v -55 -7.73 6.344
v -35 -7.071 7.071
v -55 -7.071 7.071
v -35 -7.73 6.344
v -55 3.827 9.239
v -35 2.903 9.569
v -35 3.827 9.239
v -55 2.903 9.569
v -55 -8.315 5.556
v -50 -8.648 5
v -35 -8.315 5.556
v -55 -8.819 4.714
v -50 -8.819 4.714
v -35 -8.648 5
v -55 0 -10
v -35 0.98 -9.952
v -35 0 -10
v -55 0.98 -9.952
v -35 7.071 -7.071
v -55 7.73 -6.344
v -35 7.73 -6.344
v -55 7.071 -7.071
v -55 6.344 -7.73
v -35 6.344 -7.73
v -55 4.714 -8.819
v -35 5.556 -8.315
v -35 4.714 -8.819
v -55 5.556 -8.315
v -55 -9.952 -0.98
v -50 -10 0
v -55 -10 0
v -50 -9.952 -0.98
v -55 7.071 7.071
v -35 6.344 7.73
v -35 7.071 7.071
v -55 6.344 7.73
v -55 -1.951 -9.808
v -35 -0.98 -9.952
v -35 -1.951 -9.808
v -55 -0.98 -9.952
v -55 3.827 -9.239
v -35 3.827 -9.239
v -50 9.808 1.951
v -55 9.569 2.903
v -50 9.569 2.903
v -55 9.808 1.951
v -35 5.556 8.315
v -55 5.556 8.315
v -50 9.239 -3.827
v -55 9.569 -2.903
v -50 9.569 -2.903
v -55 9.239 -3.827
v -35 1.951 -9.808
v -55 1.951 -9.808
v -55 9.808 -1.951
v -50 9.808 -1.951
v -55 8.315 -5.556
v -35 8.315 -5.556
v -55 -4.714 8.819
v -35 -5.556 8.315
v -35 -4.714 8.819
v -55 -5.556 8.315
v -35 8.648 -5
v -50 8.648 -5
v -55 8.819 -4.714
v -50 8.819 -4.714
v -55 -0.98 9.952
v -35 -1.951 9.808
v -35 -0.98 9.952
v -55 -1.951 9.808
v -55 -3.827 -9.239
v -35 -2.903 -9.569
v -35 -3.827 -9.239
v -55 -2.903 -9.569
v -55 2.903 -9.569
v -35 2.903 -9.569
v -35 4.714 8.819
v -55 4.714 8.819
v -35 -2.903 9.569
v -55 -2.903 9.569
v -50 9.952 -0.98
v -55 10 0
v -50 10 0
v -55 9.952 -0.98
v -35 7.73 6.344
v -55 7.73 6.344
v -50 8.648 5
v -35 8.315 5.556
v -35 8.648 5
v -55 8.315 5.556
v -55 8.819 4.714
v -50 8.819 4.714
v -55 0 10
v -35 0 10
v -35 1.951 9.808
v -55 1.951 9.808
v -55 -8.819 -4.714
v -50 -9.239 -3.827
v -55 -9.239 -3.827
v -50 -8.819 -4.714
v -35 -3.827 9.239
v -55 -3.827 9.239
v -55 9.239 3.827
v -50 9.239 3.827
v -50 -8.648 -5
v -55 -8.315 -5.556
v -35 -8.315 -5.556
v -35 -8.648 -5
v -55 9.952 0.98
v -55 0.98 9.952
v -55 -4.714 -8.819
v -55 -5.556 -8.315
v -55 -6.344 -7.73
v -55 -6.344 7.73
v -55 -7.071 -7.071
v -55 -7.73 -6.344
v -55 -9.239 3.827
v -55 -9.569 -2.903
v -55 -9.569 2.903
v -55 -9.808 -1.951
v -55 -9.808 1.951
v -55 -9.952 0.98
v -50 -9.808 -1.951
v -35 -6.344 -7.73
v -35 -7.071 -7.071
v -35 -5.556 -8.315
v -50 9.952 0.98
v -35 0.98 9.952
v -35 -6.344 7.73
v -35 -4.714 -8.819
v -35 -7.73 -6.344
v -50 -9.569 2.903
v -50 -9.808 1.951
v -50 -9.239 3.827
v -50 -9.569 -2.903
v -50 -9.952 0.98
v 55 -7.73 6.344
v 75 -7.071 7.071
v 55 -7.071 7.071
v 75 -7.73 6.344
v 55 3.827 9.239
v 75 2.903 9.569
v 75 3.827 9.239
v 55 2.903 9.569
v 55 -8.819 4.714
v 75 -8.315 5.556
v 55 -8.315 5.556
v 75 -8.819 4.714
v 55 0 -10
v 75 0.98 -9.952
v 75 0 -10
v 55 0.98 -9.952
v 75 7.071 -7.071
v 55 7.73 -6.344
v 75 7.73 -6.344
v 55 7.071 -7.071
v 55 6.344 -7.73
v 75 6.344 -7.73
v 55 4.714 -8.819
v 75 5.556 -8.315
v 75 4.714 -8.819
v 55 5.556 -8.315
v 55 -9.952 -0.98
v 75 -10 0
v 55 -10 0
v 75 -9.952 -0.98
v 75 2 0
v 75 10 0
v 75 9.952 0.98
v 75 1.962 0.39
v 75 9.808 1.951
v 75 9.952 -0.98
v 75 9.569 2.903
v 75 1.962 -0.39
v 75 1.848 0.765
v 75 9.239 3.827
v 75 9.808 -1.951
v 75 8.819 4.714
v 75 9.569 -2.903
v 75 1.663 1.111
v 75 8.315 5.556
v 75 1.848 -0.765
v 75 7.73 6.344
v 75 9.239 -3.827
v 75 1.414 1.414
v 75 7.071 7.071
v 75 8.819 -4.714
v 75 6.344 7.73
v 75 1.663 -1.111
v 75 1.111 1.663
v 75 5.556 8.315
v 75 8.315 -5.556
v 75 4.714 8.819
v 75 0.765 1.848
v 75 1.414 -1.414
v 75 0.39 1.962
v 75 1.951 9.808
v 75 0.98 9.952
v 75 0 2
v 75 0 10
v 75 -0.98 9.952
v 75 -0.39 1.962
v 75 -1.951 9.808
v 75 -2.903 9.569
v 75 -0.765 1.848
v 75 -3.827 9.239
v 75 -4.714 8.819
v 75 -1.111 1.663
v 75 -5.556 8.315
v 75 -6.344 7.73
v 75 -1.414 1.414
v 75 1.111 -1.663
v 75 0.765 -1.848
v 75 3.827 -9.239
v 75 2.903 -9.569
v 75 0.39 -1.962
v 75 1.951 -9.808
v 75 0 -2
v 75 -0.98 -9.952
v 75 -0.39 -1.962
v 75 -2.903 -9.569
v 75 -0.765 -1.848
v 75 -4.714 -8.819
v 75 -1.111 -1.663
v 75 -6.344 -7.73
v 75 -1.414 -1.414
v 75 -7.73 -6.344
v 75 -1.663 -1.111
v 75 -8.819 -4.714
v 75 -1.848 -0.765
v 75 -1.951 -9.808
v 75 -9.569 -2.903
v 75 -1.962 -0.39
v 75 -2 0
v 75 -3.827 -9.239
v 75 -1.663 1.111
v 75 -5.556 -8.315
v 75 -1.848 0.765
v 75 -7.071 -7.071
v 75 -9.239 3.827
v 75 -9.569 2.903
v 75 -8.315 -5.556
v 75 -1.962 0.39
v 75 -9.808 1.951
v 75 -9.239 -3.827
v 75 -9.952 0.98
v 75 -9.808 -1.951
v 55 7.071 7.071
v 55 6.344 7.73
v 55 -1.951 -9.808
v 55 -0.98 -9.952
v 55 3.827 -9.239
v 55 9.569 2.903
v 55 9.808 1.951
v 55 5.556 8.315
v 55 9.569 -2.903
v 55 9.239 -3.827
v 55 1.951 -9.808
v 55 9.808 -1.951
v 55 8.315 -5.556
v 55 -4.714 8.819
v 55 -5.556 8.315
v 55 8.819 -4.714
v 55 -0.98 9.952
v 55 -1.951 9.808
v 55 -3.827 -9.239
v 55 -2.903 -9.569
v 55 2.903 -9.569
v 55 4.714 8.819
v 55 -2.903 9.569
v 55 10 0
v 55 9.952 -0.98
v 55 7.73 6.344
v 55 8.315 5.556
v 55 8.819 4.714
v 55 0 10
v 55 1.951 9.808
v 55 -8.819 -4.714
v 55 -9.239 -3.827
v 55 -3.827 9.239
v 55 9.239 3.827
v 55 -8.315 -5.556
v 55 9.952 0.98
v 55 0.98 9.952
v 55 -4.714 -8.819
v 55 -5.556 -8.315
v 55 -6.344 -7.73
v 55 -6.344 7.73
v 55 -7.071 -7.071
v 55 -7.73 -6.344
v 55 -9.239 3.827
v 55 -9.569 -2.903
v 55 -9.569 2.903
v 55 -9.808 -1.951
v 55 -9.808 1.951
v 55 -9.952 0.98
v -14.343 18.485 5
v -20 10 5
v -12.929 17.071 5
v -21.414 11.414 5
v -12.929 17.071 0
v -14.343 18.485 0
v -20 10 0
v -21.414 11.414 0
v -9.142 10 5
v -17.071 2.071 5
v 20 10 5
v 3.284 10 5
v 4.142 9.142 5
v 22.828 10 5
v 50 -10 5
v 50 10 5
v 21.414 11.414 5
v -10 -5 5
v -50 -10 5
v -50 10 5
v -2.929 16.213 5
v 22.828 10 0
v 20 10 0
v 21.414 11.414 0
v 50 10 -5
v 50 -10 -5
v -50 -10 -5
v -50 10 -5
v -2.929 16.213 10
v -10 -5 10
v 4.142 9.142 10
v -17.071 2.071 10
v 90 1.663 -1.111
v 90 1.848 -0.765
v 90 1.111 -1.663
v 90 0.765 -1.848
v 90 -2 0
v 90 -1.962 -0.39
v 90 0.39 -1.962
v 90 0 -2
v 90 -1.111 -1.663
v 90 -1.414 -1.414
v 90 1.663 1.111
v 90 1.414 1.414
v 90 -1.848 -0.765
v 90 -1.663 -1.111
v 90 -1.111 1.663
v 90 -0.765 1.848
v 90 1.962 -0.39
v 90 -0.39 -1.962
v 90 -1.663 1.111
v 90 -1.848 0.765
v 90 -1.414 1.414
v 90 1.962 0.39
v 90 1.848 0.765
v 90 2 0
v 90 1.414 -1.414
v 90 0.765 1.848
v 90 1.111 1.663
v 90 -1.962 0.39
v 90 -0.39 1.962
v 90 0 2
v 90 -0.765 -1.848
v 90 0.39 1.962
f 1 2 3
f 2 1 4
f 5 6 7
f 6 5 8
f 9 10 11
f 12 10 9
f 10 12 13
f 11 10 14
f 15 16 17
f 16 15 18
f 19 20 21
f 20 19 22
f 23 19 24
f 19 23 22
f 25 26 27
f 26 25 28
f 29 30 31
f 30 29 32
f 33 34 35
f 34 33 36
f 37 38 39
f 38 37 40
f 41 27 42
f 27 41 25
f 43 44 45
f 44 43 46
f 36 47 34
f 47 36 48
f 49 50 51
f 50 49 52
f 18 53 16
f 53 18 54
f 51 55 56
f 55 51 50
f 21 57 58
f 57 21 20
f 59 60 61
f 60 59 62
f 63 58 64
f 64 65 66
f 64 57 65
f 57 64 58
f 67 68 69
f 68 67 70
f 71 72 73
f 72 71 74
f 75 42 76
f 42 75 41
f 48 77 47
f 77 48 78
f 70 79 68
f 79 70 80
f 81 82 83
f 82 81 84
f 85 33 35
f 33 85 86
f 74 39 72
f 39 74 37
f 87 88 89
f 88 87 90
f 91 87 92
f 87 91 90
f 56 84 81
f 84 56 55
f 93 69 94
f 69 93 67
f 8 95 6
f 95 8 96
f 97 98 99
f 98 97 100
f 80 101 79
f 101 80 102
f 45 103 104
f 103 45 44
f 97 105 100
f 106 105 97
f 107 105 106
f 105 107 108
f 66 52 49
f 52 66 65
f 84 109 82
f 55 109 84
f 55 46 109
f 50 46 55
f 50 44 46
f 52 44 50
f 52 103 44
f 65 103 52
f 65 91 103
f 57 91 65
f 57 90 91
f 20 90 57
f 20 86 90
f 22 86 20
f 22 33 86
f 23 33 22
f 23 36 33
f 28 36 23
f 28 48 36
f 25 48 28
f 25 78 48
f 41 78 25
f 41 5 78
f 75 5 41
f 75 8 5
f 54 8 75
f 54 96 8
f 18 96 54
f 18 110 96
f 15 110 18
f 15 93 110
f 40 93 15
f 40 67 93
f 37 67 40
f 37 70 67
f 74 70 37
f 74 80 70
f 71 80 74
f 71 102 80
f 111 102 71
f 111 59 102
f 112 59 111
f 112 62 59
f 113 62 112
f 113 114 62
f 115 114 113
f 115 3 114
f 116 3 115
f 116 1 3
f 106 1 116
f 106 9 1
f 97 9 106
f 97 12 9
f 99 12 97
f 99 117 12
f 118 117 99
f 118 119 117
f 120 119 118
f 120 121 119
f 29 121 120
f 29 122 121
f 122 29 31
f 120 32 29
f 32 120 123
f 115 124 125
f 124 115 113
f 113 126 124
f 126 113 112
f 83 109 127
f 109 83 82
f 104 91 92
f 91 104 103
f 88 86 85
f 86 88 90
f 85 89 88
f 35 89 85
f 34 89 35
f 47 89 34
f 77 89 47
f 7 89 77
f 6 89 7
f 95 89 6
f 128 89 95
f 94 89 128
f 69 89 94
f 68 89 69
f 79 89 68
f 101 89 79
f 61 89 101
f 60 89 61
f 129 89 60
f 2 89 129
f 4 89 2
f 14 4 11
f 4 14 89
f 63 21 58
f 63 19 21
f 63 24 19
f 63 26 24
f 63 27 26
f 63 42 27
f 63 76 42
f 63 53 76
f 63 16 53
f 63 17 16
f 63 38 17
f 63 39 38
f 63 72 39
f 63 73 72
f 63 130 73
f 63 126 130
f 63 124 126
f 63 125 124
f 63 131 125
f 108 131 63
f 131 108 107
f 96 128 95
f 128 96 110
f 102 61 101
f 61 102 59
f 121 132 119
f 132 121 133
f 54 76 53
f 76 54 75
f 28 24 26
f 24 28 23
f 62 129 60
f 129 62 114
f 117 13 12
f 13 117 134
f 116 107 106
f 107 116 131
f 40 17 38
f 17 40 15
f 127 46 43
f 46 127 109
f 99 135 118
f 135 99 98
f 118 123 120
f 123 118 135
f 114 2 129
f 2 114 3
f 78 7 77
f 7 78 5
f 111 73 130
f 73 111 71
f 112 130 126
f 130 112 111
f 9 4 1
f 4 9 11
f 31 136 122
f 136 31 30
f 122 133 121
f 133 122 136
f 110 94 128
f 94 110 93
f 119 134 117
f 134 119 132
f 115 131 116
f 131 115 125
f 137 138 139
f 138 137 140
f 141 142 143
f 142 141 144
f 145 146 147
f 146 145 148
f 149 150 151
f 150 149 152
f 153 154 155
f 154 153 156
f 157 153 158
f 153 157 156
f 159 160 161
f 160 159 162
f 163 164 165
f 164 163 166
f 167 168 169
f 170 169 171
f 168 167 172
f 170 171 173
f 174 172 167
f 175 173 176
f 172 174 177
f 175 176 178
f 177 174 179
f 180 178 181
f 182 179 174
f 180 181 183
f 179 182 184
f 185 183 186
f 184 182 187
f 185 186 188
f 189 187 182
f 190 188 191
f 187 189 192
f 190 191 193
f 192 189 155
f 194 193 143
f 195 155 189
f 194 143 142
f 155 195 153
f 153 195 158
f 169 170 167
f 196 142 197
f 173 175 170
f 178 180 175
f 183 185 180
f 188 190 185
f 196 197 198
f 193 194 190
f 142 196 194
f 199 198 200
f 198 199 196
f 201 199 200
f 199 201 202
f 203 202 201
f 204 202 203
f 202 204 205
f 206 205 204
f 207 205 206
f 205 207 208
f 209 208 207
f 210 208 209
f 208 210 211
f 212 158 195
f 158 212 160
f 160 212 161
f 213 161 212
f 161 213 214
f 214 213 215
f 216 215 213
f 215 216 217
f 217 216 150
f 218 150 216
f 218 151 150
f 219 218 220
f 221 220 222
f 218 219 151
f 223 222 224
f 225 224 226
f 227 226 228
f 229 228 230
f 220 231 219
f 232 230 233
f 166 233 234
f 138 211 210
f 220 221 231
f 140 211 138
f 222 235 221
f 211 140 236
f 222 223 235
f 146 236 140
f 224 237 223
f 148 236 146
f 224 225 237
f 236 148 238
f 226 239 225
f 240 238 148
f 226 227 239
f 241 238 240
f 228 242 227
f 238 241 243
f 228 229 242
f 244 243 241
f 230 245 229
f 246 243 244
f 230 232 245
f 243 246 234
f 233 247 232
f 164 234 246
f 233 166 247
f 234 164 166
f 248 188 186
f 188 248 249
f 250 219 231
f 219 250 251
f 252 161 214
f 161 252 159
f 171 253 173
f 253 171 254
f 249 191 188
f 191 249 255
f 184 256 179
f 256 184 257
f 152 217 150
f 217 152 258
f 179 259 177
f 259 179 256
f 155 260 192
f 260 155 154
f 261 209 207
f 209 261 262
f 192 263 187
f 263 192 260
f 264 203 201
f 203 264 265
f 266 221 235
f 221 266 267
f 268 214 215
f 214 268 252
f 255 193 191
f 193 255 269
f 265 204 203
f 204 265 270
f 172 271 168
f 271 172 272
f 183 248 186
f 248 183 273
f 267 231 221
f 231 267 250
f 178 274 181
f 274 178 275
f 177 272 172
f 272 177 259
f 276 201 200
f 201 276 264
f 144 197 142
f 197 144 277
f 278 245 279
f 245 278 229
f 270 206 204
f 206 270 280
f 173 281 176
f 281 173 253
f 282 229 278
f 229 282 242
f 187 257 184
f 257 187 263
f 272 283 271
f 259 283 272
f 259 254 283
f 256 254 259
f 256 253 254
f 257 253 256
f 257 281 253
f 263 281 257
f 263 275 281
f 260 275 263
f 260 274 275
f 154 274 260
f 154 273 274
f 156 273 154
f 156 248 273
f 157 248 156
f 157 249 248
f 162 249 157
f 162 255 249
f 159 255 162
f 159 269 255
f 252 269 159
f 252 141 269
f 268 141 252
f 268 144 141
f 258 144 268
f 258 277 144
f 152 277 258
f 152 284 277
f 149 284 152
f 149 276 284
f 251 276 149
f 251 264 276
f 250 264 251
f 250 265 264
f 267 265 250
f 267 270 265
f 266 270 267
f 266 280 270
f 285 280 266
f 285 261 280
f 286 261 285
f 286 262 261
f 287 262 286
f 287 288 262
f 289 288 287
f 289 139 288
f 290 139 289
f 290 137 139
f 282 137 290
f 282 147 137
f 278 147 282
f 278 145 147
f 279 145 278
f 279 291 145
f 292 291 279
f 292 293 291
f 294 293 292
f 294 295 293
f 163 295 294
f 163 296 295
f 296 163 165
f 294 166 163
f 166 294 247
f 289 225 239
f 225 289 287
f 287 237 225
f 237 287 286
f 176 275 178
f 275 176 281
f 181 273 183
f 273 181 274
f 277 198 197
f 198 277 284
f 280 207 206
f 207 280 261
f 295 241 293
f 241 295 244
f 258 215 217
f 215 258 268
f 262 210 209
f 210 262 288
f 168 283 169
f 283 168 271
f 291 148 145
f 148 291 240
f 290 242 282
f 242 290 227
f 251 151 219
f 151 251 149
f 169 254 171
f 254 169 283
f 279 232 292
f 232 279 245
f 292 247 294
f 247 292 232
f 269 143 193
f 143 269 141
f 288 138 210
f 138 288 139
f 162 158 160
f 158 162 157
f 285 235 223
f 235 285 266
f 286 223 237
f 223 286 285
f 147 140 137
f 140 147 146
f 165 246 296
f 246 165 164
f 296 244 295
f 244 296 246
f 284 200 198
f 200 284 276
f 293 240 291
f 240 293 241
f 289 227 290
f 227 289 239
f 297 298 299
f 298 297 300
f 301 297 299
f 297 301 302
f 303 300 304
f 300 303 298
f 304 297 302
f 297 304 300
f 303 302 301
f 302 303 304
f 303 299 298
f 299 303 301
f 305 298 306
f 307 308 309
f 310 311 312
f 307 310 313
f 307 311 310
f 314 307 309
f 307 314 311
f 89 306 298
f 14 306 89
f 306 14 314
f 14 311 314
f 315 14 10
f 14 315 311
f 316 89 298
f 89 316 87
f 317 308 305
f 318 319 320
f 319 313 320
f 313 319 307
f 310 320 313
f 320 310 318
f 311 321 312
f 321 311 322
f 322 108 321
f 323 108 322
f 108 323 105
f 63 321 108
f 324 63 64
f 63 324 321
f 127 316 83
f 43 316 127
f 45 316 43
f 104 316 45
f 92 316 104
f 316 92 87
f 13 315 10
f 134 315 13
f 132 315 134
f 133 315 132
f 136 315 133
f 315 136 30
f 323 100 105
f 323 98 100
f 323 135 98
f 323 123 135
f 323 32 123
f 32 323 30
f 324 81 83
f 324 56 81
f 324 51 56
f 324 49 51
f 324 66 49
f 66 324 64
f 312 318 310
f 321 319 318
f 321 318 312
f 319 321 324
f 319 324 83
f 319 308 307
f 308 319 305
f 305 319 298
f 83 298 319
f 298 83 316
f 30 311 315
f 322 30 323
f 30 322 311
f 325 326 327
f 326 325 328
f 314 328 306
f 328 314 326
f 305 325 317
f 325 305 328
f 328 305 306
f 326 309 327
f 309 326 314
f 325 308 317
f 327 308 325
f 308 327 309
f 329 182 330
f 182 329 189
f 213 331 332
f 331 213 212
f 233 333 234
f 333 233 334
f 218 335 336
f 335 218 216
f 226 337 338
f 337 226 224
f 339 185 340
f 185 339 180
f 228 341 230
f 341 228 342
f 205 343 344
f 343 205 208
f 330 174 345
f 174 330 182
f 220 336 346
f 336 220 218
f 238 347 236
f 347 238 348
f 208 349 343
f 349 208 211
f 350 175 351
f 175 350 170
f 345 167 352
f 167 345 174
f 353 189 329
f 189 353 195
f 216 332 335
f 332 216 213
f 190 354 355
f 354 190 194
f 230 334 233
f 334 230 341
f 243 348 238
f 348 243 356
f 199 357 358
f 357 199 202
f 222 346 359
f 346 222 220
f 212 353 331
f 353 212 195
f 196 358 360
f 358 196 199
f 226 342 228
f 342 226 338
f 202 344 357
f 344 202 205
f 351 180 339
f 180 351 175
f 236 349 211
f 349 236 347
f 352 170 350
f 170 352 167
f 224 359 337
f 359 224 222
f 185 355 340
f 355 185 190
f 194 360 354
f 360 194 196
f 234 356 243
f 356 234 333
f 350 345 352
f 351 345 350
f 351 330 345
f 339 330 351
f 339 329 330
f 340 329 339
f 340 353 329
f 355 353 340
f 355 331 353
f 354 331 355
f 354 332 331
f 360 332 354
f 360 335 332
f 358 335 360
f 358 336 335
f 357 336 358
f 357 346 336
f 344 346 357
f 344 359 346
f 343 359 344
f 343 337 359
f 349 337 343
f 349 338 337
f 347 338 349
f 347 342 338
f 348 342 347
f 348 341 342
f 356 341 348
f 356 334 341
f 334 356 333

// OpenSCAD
module armored_vehicle() {
    hull();
    end_pods();
    turret();
    barrel();
    fins();
}

module hull() {
    translate([-50, -10, -5])
        cube([100, 20, 10]);
}

module end_pods() {
    translate([-55, 0, 0])
        rotate([0, 90, 0])
        cylinder(h=20, r=10, $fn=64);
    translate([55, 0, 0])
        rotate([0, 90, 0])
        cylinder(h=20, r=10, $fn=64);
}

module turret() {
    translate([-10, -5, 5])
        scale([1, 1, 0.5])
        rotate([0, 0, 45])
        cube([20, 10, 10]);
}

module barrel() {
    translate([60, 0, 0])
        rotate([0, 90, 0])
        cylinder(h=30, r=2, $fn=32);
}

module fins() {
    translate([-20, 10, 0])
        rotate([0, 0, 45])
        cube([10, 2, 5]);
    translate([20, 10, 0])
        rotate([0, 0, -45])
        cube([10, 2, 5]);
}

armored_vehicle();
